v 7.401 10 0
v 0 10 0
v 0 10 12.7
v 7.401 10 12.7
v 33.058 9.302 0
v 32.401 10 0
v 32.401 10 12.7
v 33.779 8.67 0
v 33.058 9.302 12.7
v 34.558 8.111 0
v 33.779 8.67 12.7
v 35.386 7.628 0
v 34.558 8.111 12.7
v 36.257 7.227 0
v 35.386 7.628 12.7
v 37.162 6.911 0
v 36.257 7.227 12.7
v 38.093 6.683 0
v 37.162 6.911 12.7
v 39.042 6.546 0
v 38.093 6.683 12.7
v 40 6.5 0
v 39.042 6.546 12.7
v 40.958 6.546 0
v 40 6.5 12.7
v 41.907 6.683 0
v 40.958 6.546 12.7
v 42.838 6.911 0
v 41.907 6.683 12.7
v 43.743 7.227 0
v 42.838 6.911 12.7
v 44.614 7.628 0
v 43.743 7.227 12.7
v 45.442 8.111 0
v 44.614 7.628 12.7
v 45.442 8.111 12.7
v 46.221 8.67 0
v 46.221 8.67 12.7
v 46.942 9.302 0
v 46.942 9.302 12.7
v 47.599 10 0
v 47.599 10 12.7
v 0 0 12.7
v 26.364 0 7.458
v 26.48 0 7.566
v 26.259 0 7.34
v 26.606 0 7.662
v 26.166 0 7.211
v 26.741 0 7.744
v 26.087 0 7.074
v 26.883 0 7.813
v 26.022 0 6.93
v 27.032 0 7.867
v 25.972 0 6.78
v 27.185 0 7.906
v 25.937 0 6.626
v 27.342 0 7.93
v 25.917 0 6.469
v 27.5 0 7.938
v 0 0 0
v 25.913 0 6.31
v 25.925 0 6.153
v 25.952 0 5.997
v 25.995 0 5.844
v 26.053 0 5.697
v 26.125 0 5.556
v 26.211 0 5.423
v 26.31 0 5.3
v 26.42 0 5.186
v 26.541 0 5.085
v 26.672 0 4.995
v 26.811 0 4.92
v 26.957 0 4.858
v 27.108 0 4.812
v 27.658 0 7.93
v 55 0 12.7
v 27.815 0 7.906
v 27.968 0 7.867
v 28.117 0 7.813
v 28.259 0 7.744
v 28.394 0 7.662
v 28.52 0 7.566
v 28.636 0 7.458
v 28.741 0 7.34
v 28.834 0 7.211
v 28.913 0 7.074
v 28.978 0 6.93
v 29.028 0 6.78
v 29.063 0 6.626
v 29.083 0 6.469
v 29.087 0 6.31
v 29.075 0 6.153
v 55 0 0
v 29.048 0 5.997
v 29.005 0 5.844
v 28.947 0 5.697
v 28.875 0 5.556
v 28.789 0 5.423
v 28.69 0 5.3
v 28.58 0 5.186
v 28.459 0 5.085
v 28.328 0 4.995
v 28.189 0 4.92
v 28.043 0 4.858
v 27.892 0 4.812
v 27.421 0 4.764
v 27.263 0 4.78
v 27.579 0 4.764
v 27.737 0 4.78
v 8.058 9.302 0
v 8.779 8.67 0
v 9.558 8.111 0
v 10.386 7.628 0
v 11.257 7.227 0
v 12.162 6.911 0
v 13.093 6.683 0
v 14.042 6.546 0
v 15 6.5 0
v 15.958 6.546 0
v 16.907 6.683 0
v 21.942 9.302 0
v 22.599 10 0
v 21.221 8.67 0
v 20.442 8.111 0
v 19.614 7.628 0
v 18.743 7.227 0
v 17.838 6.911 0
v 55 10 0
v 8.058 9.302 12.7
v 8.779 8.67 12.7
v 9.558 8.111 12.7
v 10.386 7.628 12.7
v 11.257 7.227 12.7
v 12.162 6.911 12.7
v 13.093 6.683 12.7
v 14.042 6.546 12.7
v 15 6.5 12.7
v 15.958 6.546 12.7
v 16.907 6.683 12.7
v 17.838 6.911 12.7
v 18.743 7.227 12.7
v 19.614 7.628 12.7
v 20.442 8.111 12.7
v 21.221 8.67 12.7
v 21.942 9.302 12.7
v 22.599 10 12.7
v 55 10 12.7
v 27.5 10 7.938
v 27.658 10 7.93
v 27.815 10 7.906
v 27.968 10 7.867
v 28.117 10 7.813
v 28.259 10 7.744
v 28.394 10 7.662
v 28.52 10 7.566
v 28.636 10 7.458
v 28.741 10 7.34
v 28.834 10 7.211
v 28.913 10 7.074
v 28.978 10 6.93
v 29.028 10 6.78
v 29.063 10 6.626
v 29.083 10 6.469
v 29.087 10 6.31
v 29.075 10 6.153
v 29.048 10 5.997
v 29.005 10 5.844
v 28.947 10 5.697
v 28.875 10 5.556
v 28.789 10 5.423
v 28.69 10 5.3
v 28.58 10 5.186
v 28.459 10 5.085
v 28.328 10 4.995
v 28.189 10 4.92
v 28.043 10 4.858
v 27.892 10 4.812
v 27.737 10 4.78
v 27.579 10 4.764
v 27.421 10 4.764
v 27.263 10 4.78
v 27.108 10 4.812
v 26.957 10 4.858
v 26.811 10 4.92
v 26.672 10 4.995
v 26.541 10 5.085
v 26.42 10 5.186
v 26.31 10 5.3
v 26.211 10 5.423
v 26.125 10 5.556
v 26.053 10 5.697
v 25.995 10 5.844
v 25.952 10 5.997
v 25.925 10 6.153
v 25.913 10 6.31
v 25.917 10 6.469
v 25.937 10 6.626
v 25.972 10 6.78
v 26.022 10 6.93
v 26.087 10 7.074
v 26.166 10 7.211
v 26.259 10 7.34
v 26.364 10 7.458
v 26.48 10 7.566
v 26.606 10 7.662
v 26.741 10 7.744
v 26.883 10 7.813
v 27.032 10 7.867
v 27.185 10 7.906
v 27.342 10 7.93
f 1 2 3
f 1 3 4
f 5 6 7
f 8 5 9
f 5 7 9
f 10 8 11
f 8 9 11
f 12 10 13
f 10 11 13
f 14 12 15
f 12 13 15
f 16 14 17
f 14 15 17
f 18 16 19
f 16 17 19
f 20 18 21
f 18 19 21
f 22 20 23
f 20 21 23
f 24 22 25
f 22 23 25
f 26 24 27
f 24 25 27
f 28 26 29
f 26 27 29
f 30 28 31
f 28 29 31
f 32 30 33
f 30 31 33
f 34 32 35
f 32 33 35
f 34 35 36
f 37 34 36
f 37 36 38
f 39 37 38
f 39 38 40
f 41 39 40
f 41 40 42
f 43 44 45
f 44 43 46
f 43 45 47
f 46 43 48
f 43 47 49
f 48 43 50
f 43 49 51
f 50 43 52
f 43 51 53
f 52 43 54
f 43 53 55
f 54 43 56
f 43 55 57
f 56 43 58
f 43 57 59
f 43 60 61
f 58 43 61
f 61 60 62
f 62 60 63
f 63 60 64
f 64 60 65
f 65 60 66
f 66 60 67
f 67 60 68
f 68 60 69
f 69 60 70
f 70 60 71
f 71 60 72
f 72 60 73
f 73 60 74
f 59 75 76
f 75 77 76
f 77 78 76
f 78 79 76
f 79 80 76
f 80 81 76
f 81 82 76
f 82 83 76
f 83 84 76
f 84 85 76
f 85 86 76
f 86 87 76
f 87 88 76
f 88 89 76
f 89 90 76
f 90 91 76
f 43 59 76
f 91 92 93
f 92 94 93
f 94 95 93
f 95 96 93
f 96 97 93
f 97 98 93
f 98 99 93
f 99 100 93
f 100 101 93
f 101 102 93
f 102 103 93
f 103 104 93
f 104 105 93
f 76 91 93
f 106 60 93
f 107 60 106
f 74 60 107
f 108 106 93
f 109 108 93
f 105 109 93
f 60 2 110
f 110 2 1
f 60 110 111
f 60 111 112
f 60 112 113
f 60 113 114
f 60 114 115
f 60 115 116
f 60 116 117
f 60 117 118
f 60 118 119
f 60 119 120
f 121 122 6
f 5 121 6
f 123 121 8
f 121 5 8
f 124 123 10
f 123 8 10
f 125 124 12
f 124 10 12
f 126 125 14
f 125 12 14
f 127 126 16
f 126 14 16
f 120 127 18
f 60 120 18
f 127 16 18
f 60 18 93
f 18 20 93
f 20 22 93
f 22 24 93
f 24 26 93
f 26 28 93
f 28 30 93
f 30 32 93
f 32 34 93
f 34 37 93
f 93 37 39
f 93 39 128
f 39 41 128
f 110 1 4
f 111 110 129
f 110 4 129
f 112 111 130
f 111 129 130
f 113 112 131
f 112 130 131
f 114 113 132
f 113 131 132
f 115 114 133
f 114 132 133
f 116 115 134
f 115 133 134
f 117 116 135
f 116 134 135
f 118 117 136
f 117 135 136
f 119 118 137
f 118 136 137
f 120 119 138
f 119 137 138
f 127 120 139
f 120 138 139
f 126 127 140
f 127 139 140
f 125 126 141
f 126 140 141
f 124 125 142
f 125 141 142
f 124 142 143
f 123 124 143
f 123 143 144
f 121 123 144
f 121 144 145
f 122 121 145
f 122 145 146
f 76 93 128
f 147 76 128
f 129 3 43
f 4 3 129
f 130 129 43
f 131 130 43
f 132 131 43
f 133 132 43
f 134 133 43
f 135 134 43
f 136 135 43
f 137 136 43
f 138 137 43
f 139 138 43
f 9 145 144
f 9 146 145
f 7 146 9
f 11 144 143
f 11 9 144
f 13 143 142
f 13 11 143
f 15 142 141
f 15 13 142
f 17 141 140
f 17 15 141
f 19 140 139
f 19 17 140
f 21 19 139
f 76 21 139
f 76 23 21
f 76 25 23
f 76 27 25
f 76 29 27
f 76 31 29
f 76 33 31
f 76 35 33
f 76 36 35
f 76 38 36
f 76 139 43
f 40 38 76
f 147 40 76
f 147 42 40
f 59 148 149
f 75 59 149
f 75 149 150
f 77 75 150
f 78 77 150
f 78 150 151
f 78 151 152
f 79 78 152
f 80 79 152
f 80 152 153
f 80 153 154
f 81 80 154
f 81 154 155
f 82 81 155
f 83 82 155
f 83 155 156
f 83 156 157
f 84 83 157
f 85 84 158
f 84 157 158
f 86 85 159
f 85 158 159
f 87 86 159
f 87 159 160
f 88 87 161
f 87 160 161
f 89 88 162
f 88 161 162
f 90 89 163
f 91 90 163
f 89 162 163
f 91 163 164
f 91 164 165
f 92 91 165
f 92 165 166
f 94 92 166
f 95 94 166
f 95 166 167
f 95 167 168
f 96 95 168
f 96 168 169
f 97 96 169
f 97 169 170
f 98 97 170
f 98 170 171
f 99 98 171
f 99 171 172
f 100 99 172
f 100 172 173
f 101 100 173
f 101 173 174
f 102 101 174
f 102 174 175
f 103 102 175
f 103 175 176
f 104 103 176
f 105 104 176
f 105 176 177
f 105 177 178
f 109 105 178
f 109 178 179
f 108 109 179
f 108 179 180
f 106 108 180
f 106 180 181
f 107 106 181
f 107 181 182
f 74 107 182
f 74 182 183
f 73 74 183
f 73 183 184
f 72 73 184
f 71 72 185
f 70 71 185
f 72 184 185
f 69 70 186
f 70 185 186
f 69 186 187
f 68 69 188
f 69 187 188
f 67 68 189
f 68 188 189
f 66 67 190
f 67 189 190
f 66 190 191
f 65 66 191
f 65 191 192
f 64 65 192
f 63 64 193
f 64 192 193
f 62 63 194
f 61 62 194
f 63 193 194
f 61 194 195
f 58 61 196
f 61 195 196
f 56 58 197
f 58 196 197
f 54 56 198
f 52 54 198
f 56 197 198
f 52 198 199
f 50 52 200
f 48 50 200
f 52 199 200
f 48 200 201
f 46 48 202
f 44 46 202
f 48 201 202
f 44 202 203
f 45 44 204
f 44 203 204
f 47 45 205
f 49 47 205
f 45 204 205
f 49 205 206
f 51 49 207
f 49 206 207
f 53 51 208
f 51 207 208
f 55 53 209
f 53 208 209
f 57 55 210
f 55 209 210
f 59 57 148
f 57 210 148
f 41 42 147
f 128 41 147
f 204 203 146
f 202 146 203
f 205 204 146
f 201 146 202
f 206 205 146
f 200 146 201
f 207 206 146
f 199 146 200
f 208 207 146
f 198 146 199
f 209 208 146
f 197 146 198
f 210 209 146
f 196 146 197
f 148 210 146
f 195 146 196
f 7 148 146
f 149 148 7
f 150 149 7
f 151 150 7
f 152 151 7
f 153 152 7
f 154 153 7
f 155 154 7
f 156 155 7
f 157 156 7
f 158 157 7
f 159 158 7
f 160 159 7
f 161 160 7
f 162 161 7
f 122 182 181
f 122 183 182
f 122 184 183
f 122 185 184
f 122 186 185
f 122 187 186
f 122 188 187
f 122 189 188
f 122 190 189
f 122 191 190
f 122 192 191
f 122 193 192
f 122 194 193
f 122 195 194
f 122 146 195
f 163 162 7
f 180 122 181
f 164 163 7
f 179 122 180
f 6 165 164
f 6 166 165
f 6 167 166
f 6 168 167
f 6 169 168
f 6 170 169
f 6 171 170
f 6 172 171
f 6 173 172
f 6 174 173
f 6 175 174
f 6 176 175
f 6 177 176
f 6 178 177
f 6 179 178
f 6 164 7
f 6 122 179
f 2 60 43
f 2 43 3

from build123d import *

# Parameters (mm, degrees)
SKETCH4_W           = 55
SKETCH4_H           = 10
BOSS_EXTRUDE1_DEPTH = 12.7
SKETCH5_R           = 10
CUT_EXTRUDE1_DEPTH  = 58.326172033
SKETCH8_R           = 1.5875
CUT_EXTRUDE3_DEPTH  = 58.326172033


with BuildPart() as part:
    # Sketch4 → Boss-Extrude1 (new body)
    with BuildSketch(Plane.XY):
        with Locations((27.5, 5)):
            Rectangle(SKETCH4_W, SKETCH4_H)
    extrude(amount=BOSS_EXTRUDE1_DEPTH)

    # Sketch5 → Cut-Extrude1 (cut, through all)
    with BuildSketch(Plane.XY.offset(12.7)):
        with Locations((15, 16.5)):
            Circle(SKETCH5_R)
        with Locations((40, 16.5)):
            Circle(SKETCH5_R)
    extrude(amount=-CUT_EXTRUDE1_DEPTH, mode=Mode.SUBTRACT)

    # Sketch8 → Cut-Extrude3 (cut, through all)
    with BuildSketch(Plane(origin=(0, 10, 0), x_dir=(1, 0, 0), z_dir=(0, 1, 0))):
        with Locations(Location((27.5, -6.35, 0), (0, 0, 270))):
            Circle(SKETCH8_R)
    extrude(amount=-CUT_EXTRUDE3_DEPTH, mode=Mode.SUBTRACT)


solid = part.part
